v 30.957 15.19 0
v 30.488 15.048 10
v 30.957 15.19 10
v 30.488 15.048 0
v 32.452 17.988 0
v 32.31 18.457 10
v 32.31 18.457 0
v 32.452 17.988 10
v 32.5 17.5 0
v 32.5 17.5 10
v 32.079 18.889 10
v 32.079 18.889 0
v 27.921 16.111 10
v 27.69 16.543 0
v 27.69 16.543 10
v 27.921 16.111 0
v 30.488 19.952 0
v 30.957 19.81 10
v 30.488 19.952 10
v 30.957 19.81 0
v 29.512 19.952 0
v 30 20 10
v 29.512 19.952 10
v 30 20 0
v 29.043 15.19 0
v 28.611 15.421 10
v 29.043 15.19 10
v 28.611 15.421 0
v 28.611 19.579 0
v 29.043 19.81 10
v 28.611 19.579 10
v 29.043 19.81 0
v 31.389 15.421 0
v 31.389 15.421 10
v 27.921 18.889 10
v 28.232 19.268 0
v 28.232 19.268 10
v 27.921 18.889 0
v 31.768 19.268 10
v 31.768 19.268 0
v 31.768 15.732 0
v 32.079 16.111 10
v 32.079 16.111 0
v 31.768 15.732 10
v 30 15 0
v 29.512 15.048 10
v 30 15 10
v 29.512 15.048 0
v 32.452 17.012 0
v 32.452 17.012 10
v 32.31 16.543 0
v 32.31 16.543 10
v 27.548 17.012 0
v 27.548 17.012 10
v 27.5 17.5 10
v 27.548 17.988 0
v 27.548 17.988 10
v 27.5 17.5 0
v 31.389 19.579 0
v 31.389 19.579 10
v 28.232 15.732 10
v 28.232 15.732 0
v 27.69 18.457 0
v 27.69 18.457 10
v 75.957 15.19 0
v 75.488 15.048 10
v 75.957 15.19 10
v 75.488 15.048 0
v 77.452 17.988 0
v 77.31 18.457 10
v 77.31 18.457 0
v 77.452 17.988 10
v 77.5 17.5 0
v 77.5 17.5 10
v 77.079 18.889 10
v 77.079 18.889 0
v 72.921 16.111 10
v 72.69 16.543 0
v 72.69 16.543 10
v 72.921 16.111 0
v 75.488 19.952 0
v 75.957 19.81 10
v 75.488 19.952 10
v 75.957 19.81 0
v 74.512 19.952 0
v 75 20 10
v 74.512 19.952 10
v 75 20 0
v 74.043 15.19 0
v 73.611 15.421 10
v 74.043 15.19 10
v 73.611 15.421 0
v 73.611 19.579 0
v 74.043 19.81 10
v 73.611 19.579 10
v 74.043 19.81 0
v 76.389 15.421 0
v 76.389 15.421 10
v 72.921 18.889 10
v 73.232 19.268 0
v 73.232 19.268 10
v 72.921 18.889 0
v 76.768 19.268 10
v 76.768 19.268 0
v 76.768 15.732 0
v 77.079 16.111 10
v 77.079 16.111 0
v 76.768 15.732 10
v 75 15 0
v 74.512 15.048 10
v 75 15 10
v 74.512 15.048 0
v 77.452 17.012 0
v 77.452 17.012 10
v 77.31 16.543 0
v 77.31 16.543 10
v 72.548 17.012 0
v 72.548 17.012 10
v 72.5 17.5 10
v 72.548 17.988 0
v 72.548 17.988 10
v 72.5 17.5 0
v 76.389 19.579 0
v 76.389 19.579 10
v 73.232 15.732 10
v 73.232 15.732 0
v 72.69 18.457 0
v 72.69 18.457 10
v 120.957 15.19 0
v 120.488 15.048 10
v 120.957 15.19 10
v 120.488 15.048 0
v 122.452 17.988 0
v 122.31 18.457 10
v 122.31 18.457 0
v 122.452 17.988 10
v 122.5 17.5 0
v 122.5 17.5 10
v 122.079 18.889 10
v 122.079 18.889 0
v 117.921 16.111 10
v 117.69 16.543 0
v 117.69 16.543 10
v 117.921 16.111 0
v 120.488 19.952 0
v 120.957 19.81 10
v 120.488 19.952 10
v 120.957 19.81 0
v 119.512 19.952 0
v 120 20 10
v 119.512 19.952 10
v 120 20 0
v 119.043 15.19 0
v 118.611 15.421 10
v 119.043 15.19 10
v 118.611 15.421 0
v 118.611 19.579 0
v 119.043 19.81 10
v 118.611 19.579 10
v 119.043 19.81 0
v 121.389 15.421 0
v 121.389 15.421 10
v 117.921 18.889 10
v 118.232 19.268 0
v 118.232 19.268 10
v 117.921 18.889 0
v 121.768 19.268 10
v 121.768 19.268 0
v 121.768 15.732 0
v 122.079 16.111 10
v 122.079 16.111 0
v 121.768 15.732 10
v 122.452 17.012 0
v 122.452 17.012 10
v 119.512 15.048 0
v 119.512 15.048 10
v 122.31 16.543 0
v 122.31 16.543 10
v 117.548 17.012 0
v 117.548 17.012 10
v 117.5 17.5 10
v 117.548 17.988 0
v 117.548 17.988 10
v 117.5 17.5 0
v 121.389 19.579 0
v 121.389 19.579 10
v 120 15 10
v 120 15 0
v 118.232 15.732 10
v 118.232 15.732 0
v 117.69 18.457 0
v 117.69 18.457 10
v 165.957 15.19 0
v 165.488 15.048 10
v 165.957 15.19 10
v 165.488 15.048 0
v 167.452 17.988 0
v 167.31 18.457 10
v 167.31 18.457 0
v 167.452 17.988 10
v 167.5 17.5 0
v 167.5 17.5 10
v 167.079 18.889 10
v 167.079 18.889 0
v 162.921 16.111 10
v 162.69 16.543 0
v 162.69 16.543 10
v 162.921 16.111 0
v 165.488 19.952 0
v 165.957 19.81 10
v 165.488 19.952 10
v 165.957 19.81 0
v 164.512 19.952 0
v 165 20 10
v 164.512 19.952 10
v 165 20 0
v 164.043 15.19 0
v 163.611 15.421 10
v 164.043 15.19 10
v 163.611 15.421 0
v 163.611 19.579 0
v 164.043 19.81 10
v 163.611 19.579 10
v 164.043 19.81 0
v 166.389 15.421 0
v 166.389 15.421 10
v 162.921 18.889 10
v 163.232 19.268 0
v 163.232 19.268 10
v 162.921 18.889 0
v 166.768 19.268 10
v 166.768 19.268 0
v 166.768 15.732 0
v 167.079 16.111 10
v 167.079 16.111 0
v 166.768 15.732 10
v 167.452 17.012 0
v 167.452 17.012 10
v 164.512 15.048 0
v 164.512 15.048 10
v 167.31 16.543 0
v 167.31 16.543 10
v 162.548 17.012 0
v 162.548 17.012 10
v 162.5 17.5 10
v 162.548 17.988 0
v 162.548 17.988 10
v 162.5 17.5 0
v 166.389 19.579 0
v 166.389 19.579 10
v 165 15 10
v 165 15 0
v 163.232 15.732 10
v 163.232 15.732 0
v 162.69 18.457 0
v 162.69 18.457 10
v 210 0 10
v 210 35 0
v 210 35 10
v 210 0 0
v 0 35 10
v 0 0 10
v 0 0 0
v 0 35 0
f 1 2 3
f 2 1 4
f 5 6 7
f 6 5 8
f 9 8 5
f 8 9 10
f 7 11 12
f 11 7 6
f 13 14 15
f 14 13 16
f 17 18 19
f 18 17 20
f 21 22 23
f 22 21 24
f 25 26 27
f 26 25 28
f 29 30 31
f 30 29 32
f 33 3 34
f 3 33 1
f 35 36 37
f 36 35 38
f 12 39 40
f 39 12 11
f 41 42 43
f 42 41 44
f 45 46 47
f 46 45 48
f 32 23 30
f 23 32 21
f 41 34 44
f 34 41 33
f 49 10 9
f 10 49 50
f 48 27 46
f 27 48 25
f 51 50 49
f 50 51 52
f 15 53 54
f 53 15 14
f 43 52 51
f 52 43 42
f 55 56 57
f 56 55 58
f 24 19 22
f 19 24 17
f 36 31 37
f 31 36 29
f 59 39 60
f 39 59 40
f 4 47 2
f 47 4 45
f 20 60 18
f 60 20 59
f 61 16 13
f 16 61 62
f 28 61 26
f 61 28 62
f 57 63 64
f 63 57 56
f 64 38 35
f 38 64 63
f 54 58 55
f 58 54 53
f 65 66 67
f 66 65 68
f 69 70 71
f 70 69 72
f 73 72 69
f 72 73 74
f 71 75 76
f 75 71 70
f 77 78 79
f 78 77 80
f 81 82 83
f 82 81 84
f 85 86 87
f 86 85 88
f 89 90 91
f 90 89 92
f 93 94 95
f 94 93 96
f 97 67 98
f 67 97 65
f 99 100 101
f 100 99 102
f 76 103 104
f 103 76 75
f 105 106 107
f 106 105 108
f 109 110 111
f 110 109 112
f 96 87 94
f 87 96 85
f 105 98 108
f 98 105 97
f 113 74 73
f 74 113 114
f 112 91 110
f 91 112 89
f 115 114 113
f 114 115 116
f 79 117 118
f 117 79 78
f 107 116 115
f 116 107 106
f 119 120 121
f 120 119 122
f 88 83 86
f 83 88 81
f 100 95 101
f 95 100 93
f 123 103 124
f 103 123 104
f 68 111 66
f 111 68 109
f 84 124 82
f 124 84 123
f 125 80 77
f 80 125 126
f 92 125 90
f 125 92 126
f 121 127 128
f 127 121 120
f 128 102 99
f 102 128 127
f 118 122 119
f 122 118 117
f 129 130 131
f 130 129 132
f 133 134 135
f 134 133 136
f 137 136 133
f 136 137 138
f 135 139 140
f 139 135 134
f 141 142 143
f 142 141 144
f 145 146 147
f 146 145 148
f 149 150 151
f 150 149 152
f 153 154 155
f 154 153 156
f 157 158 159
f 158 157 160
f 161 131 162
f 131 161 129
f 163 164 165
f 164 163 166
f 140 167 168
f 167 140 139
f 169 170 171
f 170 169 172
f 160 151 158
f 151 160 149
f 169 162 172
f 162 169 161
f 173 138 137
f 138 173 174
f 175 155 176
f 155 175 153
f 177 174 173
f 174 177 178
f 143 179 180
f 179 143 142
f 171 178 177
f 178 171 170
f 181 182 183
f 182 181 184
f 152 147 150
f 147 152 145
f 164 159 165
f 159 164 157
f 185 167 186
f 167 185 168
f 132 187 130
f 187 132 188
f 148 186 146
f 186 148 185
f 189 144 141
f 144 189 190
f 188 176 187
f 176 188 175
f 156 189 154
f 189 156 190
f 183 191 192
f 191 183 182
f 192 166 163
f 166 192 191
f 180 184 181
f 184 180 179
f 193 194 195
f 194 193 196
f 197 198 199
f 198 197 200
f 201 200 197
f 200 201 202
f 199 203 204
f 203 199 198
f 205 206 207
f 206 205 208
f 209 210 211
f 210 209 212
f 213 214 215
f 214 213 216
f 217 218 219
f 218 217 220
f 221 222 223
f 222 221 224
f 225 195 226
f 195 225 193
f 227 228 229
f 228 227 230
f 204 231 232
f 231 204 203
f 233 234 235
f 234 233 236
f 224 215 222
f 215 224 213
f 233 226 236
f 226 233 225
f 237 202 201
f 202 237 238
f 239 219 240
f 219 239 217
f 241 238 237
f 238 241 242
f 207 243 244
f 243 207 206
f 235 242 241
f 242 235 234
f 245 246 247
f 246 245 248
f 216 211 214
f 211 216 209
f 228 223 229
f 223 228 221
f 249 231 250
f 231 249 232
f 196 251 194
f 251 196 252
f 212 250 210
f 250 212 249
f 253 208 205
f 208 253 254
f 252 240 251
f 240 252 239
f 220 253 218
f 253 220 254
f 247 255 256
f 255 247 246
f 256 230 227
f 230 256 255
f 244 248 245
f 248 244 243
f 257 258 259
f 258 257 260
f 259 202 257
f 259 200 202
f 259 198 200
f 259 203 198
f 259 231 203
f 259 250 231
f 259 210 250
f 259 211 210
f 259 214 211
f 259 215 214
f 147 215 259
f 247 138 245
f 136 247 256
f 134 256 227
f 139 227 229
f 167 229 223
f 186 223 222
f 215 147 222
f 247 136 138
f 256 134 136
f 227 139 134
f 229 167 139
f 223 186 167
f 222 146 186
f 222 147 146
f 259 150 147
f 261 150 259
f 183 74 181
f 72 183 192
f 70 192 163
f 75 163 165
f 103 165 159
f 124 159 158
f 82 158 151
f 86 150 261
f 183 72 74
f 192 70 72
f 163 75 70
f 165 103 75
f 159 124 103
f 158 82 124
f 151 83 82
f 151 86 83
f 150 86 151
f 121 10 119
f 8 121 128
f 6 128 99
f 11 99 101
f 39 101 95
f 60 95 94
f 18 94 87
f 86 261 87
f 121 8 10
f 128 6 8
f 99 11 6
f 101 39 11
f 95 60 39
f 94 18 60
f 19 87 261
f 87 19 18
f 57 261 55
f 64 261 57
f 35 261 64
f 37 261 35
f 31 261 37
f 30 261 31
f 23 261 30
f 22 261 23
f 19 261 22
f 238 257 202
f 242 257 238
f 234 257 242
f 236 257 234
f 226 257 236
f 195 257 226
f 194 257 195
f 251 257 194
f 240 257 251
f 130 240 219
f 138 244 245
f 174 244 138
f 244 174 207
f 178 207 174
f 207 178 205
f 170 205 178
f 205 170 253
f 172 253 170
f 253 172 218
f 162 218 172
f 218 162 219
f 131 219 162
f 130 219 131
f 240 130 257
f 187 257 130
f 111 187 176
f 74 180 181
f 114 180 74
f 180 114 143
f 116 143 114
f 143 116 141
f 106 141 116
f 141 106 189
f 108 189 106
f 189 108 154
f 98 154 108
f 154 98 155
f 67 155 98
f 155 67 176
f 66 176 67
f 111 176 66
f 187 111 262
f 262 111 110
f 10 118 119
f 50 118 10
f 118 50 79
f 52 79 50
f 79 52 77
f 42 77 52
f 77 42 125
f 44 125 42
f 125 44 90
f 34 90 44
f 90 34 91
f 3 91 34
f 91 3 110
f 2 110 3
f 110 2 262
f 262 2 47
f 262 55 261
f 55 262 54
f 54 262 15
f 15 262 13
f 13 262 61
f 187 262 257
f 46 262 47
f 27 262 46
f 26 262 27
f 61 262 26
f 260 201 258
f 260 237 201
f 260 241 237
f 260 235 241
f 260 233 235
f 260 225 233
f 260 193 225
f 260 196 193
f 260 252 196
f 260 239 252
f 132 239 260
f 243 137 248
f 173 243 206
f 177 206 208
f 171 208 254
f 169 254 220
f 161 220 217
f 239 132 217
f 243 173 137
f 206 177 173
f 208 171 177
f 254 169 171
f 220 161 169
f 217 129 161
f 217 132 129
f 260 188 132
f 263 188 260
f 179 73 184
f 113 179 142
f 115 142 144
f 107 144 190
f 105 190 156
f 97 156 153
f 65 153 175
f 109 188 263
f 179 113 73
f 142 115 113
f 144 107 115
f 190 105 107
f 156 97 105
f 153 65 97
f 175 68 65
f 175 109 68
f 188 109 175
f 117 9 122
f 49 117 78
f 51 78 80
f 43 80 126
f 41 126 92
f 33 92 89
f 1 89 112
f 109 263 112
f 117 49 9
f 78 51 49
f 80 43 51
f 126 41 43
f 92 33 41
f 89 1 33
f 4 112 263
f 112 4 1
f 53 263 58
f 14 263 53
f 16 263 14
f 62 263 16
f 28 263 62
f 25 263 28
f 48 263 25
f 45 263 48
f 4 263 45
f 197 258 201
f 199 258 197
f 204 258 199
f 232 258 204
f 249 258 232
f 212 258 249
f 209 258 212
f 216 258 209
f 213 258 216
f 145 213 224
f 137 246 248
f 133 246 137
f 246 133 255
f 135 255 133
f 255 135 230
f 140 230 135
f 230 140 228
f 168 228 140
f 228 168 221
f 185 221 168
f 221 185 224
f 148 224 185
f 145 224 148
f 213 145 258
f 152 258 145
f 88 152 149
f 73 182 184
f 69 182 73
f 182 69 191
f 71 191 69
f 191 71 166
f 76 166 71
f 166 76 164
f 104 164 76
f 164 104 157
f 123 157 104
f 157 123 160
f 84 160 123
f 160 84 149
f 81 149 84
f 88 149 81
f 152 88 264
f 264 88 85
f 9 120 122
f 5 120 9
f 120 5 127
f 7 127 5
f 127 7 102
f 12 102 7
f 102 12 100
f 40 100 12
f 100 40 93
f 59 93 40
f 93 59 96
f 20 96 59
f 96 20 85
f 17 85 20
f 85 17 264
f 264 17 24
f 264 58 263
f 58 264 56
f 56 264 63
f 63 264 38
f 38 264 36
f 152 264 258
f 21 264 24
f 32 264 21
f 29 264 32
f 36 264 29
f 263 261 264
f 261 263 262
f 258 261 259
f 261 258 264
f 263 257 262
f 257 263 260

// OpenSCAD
$fn = 32;

// ----------------------------------------------------------------------
// Long rail: 200-250 mm mounting rail
// ----------------------------------------------------------------------

// --- parameters (mm) ---
rail_l = 210;             // rail length, X
rail_w = 35;              // rail width, Y
rail_t = 10;              // rail thickness, Z
hole_d = 5;               // mounting hole diameter
hole_start = 30;          // first hole offset from the end
hole_pitch = 45;          // hole pitch
holes = 4;                // number of holes

difference() {
  cube([rail_l, rail_w, rail_t]);
  for (i = [0 : holes - 1])
    translate([hole_start + i * hole_pitch, rail_w / 2, -1])
      cylinder(h = rail_t + 2, d = hole_d);
}
